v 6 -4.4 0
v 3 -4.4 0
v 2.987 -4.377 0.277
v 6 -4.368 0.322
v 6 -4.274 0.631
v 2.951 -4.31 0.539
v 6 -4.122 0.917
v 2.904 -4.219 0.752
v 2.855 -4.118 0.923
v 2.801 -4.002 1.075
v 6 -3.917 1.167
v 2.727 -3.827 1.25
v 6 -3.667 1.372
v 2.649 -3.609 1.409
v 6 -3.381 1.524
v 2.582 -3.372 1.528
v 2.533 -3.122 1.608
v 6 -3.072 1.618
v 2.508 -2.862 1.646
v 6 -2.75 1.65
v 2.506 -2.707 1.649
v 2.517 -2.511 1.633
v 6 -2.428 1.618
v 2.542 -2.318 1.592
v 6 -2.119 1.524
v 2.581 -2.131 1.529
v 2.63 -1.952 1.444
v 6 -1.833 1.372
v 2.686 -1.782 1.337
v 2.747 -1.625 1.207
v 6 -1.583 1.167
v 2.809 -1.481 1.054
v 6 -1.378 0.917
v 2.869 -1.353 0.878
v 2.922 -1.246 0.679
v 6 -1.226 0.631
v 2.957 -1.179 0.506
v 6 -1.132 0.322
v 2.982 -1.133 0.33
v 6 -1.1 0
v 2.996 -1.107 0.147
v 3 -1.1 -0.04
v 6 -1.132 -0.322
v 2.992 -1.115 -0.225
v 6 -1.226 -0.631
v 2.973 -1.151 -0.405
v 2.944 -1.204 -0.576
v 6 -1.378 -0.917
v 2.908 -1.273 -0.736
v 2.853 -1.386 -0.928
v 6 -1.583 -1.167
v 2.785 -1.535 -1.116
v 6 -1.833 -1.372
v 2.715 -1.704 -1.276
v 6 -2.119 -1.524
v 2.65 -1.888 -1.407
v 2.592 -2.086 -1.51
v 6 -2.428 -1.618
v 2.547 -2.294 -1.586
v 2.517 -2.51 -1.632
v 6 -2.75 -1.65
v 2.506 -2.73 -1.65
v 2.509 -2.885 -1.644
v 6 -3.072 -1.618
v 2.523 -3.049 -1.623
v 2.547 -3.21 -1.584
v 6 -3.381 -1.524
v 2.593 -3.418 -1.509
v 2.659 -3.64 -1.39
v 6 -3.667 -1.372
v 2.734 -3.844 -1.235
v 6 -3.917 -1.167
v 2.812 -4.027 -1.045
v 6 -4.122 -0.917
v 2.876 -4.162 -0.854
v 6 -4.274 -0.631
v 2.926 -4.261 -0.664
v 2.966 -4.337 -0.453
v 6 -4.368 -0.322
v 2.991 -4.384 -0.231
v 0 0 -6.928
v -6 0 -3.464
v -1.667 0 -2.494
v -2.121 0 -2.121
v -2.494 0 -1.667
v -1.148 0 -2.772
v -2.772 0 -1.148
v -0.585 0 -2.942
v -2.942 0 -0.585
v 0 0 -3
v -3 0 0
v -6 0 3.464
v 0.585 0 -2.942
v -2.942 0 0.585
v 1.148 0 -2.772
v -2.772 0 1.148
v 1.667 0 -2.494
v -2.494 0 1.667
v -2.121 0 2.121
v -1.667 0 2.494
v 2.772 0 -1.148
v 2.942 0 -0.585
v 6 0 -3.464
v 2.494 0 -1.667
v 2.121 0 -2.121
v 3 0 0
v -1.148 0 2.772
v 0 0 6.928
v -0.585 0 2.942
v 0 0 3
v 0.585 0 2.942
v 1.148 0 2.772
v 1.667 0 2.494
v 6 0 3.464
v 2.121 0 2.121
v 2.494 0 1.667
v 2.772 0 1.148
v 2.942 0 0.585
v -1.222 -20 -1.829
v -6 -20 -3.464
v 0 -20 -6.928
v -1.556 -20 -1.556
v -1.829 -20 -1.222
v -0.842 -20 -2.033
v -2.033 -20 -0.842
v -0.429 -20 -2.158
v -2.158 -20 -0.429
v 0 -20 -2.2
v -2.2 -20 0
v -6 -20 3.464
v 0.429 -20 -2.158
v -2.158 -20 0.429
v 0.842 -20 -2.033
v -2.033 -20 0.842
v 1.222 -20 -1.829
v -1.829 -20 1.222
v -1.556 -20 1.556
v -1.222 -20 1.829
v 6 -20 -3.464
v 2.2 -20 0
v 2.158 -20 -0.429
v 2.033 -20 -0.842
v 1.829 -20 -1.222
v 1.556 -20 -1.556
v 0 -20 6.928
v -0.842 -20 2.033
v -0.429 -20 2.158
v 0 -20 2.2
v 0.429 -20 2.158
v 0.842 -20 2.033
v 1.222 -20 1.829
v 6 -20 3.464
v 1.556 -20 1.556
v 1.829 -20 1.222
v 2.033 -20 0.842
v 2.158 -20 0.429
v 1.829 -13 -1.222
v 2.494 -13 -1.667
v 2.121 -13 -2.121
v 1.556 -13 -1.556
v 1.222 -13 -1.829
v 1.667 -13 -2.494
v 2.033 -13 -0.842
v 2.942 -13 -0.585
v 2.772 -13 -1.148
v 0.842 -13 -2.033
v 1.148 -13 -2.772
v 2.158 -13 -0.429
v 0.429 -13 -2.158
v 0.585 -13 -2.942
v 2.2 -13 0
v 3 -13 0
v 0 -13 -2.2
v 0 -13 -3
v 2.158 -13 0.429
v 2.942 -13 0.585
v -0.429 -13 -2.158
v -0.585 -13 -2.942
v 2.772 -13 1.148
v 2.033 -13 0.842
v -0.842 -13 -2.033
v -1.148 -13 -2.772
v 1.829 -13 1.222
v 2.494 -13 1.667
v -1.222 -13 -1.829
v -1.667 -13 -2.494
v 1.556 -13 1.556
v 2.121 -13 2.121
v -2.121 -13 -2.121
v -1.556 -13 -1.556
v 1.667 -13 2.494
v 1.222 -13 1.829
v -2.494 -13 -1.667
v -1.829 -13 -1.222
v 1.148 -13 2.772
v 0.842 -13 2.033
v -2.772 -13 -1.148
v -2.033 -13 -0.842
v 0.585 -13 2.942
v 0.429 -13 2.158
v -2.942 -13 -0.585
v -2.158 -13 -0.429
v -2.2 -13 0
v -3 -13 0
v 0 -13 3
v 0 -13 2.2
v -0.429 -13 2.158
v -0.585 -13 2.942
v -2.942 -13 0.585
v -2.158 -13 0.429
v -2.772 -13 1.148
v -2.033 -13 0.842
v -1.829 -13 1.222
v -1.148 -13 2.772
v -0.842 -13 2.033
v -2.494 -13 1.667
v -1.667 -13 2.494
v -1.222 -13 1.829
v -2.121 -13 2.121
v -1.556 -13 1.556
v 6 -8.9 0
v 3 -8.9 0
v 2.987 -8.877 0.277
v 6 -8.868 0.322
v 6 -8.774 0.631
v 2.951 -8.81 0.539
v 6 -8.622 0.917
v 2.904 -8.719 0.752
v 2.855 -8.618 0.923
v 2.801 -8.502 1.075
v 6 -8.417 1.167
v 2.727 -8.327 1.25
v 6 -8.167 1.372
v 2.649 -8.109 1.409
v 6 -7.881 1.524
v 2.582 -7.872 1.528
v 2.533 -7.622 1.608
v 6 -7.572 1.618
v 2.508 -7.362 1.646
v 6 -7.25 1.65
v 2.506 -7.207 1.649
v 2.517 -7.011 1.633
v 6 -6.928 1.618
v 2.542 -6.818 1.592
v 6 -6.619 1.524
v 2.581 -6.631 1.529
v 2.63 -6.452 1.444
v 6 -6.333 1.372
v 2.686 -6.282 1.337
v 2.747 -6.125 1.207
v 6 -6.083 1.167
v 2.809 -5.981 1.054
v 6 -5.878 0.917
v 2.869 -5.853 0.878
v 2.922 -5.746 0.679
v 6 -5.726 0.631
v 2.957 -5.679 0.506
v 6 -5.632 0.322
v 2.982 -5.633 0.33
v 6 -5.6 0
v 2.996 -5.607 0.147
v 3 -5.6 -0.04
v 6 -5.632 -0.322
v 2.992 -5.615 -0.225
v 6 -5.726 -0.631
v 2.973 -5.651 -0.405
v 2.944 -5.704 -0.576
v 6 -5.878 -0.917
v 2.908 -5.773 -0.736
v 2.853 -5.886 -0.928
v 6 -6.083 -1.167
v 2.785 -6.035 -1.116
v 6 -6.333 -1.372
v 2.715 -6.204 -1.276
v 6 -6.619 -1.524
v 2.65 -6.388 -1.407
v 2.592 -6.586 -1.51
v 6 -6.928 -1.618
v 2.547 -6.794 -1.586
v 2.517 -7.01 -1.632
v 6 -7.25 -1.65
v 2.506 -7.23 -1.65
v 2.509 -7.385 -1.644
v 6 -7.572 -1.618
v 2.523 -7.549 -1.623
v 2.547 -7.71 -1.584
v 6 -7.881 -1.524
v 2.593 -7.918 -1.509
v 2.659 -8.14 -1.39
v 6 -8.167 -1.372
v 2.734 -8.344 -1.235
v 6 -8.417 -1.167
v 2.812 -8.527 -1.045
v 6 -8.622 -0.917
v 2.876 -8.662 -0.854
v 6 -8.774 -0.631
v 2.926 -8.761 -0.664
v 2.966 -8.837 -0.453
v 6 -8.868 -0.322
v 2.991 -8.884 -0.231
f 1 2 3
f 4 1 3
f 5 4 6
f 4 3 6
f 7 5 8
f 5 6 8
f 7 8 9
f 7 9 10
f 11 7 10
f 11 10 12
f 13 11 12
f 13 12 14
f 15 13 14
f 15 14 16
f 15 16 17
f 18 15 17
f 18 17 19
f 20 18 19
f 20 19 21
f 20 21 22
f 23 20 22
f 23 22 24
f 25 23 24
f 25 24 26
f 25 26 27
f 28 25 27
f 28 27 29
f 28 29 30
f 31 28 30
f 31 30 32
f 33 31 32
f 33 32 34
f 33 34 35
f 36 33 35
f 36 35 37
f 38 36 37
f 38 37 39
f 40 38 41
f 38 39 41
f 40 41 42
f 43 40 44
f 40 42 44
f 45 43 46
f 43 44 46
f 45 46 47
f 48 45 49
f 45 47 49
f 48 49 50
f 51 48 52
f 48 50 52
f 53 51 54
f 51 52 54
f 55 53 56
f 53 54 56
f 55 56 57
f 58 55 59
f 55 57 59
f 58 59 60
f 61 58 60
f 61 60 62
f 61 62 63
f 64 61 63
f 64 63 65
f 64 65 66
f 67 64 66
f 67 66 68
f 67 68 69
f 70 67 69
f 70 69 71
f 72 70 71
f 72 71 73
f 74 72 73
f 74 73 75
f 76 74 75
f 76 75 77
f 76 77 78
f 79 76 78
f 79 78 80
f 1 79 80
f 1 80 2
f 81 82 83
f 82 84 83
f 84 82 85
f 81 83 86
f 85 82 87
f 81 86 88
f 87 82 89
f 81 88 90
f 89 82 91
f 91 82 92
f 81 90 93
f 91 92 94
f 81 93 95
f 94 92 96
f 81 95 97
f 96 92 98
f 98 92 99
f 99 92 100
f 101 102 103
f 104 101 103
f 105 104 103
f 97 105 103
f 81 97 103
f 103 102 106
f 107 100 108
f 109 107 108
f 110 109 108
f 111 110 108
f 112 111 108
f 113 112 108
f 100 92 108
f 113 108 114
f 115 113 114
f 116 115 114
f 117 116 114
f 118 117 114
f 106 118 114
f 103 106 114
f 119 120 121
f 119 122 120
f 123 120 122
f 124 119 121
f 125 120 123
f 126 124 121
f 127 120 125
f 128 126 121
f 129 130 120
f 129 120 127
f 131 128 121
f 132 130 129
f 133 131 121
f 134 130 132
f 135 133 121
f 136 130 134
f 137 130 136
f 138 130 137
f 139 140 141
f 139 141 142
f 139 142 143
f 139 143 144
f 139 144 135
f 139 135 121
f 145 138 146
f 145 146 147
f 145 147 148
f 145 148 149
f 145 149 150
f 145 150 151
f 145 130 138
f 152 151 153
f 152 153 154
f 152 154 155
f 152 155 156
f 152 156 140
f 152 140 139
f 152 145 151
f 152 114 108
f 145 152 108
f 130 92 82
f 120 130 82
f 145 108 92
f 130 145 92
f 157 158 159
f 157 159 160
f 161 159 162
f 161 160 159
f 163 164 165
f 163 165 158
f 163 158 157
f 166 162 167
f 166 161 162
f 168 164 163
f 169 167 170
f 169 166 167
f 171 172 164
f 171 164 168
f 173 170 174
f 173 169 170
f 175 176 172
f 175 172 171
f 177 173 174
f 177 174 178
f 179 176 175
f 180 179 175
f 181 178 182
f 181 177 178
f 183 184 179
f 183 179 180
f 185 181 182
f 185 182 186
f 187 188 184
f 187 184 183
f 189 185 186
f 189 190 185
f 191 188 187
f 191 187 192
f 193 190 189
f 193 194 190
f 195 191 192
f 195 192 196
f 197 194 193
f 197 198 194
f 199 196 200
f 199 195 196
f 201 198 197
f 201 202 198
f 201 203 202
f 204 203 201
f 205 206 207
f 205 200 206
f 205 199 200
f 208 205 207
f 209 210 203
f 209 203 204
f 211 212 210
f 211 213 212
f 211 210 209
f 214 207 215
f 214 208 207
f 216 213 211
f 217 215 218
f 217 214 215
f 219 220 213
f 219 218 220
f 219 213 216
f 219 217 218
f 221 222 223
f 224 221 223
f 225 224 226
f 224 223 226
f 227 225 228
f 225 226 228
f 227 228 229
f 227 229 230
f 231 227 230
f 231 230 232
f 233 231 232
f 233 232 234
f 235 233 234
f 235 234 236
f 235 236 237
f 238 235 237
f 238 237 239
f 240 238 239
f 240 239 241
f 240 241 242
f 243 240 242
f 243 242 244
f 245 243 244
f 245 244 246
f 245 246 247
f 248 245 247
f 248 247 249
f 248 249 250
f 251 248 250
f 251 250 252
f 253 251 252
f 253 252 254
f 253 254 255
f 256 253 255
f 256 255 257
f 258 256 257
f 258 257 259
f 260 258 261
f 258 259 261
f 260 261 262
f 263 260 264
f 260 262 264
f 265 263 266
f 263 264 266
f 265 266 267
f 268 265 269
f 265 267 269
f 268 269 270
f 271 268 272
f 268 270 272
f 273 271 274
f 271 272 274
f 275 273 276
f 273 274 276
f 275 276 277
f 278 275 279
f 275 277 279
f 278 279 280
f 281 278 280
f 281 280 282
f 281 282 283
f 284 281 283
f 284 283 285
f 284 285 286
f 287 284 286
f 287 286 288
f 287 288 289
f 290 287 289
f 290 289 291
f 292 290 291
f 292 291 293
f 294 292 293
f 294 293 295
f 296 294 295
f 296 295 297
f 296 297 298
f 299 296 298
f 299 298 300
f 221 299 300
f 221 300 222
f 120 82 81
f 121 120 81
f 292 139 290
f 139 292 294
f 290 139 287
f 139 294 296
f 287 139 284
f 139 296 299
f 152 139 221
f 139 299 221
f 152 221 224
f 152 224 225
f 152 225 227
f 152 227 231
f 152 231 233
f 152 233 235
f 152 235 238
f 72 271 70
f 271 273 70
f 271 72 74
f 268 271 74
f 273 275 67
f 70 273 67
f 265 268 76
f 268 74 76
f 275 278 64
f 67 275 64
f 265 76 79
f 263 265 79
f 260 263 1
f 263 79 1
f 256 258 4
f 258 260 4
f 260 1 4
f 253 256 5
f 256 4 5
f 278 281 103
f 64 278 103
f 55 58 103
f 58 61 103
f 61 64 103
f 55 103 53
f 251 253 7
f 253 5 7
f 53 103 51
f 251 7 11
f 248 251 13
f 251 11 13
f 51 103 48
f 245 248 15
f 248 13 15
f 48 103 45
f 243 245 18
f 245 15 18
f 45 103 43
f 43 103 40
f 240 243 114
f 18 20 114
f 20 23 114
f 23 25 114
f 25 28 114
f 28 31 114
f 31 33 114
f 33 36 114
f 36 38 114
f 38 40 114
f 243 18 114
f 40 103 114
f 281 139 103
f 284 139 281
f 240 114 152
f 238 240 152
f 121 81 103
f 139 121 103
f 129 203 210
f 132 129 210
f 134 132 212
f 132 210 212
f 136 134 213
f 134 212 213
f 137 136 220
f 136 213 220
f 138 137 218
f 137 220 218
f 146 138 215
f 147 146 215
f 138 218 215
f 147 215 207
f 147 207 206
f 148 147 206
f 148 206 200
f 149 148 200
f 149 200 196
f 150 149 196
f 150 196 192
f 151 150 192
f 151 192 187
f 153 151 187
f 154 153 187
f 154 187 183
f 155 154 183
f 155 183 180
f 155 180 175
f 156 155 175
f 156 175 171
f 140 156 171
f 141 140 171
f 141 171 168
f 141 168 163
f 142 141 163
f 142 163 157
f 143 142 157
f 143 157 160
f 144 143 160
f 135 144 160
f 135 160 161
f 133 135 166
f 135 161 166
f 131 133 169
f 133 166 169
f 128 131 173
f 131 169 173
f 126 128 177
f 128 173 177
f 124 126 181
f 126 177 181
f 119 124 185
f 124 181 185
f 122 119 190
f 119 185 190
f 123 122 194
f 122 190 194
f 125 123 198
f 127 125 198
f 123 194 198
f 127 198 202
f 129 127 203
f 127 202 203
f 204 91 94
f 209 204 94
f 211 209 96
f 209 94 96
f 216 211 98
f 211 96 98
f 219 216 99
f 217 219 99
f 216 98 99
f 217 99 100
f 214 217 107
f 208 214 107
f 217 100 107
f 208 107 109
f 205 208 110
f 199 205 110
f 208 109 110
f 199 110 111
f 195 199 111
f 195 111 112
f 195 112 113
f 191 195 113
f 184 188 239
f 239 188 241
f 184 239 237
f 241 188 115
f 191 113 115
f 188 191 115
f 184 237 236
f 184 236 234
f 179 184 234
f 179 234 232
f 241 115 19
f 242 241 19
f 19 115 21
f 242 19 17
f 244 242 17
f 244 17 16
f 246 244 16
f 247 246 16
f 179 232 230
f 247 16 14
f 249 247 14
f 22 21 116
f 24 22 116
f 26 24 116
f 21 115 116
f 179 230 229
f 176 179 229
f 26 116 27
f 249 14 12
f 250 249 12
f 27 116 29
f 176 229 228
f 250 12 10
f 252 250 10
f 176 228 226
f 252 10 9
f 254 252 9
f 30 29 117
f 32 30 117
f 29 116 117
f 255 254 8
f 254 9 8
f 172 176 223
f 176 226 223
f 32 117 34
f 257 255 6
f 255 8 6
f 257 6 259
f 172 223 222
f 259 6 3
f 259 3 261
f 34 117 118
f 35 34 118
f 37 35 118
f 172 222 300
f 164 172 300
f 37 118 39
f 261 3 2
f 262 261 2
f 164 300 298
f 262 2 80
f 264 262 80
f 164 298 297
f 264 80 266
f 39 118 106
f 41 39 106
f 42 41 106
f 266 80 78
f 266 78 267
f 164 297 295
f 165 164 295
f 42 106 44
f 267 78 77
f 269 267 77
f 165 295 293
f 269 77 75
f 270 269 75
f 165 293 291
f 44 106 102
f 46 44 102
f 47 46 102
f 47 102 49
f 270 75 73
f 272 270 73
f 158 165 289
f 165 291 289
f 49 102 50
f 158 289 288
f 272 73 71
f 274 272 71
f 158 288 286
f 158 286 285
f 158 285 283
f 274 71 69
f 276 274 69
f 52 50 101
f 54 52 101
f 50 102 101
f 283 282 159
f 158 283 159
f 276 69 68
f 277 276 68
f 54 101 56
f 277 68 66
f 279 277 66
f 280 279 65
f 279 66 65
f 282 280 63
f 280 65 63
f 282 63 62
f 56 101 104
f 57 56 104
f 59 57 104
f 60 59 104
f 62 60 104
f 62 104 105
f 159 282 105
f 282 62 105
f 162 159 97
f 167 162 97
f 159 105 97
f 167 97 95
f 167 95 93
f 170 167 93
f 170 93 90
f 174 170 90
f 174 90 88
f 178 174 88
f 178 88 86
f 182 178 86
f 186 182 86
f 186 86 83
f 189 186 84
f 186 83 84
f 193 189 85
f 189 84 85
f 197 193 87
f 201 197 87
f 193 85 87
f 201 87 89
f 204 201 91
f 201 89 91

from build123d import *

# Parameters (mm, degrees)
F1_DEPTH = 20
F2_R     = 3
F3_DEPTH = 13
F5_D     = 4.4
F7_D     = 3.3
F7_DEPTH = 6
F7_TIP   = 0.9914200214


with BuildPart() as f1:
    # F0 (on Front) → F1 (new body)
    with BuildSketch(Plane.XZ):
        Polygon((6, -3.4641016151), (6, 3.4641016151), (0, 6.9282032303), (-6, 3.4641016151), (-6, -3.4641016151), (0, -6.9282032303), align=None)
    extrude(amount=F1_DEPTH)

    # F2 (on face) → F3 (cut)
    with BuildSketch(Plane(origin=(0, 0, 0), x_dir=(-1, 0, 0), z_dir=(0, 1, 0))):
        Circle(F2_R)
    extrude(amount=-F3_DEPTH, mode=Mode.SUBTRACT)

    # F5 (through all)
    with Locations(Plane.XZ.offset(20)):
        with Locations((0, 0)):
            Hole(F5_D / 2)

    # F7
    with Locations(Plane.YZ.offset(6)):
        with Locations((-2.75, 0), (-7.25, 0)):
            Hole(F7_D / 2, depth=F7_DEPTH)
            with Locations((0, 0, -(F7_DEPTH + F7_TIP / 2))):  # 118° drill point
                Cone(0, F7_D / 2, F7_TIP, mode=Mode.SUBTRACT)


solid = f1.part
